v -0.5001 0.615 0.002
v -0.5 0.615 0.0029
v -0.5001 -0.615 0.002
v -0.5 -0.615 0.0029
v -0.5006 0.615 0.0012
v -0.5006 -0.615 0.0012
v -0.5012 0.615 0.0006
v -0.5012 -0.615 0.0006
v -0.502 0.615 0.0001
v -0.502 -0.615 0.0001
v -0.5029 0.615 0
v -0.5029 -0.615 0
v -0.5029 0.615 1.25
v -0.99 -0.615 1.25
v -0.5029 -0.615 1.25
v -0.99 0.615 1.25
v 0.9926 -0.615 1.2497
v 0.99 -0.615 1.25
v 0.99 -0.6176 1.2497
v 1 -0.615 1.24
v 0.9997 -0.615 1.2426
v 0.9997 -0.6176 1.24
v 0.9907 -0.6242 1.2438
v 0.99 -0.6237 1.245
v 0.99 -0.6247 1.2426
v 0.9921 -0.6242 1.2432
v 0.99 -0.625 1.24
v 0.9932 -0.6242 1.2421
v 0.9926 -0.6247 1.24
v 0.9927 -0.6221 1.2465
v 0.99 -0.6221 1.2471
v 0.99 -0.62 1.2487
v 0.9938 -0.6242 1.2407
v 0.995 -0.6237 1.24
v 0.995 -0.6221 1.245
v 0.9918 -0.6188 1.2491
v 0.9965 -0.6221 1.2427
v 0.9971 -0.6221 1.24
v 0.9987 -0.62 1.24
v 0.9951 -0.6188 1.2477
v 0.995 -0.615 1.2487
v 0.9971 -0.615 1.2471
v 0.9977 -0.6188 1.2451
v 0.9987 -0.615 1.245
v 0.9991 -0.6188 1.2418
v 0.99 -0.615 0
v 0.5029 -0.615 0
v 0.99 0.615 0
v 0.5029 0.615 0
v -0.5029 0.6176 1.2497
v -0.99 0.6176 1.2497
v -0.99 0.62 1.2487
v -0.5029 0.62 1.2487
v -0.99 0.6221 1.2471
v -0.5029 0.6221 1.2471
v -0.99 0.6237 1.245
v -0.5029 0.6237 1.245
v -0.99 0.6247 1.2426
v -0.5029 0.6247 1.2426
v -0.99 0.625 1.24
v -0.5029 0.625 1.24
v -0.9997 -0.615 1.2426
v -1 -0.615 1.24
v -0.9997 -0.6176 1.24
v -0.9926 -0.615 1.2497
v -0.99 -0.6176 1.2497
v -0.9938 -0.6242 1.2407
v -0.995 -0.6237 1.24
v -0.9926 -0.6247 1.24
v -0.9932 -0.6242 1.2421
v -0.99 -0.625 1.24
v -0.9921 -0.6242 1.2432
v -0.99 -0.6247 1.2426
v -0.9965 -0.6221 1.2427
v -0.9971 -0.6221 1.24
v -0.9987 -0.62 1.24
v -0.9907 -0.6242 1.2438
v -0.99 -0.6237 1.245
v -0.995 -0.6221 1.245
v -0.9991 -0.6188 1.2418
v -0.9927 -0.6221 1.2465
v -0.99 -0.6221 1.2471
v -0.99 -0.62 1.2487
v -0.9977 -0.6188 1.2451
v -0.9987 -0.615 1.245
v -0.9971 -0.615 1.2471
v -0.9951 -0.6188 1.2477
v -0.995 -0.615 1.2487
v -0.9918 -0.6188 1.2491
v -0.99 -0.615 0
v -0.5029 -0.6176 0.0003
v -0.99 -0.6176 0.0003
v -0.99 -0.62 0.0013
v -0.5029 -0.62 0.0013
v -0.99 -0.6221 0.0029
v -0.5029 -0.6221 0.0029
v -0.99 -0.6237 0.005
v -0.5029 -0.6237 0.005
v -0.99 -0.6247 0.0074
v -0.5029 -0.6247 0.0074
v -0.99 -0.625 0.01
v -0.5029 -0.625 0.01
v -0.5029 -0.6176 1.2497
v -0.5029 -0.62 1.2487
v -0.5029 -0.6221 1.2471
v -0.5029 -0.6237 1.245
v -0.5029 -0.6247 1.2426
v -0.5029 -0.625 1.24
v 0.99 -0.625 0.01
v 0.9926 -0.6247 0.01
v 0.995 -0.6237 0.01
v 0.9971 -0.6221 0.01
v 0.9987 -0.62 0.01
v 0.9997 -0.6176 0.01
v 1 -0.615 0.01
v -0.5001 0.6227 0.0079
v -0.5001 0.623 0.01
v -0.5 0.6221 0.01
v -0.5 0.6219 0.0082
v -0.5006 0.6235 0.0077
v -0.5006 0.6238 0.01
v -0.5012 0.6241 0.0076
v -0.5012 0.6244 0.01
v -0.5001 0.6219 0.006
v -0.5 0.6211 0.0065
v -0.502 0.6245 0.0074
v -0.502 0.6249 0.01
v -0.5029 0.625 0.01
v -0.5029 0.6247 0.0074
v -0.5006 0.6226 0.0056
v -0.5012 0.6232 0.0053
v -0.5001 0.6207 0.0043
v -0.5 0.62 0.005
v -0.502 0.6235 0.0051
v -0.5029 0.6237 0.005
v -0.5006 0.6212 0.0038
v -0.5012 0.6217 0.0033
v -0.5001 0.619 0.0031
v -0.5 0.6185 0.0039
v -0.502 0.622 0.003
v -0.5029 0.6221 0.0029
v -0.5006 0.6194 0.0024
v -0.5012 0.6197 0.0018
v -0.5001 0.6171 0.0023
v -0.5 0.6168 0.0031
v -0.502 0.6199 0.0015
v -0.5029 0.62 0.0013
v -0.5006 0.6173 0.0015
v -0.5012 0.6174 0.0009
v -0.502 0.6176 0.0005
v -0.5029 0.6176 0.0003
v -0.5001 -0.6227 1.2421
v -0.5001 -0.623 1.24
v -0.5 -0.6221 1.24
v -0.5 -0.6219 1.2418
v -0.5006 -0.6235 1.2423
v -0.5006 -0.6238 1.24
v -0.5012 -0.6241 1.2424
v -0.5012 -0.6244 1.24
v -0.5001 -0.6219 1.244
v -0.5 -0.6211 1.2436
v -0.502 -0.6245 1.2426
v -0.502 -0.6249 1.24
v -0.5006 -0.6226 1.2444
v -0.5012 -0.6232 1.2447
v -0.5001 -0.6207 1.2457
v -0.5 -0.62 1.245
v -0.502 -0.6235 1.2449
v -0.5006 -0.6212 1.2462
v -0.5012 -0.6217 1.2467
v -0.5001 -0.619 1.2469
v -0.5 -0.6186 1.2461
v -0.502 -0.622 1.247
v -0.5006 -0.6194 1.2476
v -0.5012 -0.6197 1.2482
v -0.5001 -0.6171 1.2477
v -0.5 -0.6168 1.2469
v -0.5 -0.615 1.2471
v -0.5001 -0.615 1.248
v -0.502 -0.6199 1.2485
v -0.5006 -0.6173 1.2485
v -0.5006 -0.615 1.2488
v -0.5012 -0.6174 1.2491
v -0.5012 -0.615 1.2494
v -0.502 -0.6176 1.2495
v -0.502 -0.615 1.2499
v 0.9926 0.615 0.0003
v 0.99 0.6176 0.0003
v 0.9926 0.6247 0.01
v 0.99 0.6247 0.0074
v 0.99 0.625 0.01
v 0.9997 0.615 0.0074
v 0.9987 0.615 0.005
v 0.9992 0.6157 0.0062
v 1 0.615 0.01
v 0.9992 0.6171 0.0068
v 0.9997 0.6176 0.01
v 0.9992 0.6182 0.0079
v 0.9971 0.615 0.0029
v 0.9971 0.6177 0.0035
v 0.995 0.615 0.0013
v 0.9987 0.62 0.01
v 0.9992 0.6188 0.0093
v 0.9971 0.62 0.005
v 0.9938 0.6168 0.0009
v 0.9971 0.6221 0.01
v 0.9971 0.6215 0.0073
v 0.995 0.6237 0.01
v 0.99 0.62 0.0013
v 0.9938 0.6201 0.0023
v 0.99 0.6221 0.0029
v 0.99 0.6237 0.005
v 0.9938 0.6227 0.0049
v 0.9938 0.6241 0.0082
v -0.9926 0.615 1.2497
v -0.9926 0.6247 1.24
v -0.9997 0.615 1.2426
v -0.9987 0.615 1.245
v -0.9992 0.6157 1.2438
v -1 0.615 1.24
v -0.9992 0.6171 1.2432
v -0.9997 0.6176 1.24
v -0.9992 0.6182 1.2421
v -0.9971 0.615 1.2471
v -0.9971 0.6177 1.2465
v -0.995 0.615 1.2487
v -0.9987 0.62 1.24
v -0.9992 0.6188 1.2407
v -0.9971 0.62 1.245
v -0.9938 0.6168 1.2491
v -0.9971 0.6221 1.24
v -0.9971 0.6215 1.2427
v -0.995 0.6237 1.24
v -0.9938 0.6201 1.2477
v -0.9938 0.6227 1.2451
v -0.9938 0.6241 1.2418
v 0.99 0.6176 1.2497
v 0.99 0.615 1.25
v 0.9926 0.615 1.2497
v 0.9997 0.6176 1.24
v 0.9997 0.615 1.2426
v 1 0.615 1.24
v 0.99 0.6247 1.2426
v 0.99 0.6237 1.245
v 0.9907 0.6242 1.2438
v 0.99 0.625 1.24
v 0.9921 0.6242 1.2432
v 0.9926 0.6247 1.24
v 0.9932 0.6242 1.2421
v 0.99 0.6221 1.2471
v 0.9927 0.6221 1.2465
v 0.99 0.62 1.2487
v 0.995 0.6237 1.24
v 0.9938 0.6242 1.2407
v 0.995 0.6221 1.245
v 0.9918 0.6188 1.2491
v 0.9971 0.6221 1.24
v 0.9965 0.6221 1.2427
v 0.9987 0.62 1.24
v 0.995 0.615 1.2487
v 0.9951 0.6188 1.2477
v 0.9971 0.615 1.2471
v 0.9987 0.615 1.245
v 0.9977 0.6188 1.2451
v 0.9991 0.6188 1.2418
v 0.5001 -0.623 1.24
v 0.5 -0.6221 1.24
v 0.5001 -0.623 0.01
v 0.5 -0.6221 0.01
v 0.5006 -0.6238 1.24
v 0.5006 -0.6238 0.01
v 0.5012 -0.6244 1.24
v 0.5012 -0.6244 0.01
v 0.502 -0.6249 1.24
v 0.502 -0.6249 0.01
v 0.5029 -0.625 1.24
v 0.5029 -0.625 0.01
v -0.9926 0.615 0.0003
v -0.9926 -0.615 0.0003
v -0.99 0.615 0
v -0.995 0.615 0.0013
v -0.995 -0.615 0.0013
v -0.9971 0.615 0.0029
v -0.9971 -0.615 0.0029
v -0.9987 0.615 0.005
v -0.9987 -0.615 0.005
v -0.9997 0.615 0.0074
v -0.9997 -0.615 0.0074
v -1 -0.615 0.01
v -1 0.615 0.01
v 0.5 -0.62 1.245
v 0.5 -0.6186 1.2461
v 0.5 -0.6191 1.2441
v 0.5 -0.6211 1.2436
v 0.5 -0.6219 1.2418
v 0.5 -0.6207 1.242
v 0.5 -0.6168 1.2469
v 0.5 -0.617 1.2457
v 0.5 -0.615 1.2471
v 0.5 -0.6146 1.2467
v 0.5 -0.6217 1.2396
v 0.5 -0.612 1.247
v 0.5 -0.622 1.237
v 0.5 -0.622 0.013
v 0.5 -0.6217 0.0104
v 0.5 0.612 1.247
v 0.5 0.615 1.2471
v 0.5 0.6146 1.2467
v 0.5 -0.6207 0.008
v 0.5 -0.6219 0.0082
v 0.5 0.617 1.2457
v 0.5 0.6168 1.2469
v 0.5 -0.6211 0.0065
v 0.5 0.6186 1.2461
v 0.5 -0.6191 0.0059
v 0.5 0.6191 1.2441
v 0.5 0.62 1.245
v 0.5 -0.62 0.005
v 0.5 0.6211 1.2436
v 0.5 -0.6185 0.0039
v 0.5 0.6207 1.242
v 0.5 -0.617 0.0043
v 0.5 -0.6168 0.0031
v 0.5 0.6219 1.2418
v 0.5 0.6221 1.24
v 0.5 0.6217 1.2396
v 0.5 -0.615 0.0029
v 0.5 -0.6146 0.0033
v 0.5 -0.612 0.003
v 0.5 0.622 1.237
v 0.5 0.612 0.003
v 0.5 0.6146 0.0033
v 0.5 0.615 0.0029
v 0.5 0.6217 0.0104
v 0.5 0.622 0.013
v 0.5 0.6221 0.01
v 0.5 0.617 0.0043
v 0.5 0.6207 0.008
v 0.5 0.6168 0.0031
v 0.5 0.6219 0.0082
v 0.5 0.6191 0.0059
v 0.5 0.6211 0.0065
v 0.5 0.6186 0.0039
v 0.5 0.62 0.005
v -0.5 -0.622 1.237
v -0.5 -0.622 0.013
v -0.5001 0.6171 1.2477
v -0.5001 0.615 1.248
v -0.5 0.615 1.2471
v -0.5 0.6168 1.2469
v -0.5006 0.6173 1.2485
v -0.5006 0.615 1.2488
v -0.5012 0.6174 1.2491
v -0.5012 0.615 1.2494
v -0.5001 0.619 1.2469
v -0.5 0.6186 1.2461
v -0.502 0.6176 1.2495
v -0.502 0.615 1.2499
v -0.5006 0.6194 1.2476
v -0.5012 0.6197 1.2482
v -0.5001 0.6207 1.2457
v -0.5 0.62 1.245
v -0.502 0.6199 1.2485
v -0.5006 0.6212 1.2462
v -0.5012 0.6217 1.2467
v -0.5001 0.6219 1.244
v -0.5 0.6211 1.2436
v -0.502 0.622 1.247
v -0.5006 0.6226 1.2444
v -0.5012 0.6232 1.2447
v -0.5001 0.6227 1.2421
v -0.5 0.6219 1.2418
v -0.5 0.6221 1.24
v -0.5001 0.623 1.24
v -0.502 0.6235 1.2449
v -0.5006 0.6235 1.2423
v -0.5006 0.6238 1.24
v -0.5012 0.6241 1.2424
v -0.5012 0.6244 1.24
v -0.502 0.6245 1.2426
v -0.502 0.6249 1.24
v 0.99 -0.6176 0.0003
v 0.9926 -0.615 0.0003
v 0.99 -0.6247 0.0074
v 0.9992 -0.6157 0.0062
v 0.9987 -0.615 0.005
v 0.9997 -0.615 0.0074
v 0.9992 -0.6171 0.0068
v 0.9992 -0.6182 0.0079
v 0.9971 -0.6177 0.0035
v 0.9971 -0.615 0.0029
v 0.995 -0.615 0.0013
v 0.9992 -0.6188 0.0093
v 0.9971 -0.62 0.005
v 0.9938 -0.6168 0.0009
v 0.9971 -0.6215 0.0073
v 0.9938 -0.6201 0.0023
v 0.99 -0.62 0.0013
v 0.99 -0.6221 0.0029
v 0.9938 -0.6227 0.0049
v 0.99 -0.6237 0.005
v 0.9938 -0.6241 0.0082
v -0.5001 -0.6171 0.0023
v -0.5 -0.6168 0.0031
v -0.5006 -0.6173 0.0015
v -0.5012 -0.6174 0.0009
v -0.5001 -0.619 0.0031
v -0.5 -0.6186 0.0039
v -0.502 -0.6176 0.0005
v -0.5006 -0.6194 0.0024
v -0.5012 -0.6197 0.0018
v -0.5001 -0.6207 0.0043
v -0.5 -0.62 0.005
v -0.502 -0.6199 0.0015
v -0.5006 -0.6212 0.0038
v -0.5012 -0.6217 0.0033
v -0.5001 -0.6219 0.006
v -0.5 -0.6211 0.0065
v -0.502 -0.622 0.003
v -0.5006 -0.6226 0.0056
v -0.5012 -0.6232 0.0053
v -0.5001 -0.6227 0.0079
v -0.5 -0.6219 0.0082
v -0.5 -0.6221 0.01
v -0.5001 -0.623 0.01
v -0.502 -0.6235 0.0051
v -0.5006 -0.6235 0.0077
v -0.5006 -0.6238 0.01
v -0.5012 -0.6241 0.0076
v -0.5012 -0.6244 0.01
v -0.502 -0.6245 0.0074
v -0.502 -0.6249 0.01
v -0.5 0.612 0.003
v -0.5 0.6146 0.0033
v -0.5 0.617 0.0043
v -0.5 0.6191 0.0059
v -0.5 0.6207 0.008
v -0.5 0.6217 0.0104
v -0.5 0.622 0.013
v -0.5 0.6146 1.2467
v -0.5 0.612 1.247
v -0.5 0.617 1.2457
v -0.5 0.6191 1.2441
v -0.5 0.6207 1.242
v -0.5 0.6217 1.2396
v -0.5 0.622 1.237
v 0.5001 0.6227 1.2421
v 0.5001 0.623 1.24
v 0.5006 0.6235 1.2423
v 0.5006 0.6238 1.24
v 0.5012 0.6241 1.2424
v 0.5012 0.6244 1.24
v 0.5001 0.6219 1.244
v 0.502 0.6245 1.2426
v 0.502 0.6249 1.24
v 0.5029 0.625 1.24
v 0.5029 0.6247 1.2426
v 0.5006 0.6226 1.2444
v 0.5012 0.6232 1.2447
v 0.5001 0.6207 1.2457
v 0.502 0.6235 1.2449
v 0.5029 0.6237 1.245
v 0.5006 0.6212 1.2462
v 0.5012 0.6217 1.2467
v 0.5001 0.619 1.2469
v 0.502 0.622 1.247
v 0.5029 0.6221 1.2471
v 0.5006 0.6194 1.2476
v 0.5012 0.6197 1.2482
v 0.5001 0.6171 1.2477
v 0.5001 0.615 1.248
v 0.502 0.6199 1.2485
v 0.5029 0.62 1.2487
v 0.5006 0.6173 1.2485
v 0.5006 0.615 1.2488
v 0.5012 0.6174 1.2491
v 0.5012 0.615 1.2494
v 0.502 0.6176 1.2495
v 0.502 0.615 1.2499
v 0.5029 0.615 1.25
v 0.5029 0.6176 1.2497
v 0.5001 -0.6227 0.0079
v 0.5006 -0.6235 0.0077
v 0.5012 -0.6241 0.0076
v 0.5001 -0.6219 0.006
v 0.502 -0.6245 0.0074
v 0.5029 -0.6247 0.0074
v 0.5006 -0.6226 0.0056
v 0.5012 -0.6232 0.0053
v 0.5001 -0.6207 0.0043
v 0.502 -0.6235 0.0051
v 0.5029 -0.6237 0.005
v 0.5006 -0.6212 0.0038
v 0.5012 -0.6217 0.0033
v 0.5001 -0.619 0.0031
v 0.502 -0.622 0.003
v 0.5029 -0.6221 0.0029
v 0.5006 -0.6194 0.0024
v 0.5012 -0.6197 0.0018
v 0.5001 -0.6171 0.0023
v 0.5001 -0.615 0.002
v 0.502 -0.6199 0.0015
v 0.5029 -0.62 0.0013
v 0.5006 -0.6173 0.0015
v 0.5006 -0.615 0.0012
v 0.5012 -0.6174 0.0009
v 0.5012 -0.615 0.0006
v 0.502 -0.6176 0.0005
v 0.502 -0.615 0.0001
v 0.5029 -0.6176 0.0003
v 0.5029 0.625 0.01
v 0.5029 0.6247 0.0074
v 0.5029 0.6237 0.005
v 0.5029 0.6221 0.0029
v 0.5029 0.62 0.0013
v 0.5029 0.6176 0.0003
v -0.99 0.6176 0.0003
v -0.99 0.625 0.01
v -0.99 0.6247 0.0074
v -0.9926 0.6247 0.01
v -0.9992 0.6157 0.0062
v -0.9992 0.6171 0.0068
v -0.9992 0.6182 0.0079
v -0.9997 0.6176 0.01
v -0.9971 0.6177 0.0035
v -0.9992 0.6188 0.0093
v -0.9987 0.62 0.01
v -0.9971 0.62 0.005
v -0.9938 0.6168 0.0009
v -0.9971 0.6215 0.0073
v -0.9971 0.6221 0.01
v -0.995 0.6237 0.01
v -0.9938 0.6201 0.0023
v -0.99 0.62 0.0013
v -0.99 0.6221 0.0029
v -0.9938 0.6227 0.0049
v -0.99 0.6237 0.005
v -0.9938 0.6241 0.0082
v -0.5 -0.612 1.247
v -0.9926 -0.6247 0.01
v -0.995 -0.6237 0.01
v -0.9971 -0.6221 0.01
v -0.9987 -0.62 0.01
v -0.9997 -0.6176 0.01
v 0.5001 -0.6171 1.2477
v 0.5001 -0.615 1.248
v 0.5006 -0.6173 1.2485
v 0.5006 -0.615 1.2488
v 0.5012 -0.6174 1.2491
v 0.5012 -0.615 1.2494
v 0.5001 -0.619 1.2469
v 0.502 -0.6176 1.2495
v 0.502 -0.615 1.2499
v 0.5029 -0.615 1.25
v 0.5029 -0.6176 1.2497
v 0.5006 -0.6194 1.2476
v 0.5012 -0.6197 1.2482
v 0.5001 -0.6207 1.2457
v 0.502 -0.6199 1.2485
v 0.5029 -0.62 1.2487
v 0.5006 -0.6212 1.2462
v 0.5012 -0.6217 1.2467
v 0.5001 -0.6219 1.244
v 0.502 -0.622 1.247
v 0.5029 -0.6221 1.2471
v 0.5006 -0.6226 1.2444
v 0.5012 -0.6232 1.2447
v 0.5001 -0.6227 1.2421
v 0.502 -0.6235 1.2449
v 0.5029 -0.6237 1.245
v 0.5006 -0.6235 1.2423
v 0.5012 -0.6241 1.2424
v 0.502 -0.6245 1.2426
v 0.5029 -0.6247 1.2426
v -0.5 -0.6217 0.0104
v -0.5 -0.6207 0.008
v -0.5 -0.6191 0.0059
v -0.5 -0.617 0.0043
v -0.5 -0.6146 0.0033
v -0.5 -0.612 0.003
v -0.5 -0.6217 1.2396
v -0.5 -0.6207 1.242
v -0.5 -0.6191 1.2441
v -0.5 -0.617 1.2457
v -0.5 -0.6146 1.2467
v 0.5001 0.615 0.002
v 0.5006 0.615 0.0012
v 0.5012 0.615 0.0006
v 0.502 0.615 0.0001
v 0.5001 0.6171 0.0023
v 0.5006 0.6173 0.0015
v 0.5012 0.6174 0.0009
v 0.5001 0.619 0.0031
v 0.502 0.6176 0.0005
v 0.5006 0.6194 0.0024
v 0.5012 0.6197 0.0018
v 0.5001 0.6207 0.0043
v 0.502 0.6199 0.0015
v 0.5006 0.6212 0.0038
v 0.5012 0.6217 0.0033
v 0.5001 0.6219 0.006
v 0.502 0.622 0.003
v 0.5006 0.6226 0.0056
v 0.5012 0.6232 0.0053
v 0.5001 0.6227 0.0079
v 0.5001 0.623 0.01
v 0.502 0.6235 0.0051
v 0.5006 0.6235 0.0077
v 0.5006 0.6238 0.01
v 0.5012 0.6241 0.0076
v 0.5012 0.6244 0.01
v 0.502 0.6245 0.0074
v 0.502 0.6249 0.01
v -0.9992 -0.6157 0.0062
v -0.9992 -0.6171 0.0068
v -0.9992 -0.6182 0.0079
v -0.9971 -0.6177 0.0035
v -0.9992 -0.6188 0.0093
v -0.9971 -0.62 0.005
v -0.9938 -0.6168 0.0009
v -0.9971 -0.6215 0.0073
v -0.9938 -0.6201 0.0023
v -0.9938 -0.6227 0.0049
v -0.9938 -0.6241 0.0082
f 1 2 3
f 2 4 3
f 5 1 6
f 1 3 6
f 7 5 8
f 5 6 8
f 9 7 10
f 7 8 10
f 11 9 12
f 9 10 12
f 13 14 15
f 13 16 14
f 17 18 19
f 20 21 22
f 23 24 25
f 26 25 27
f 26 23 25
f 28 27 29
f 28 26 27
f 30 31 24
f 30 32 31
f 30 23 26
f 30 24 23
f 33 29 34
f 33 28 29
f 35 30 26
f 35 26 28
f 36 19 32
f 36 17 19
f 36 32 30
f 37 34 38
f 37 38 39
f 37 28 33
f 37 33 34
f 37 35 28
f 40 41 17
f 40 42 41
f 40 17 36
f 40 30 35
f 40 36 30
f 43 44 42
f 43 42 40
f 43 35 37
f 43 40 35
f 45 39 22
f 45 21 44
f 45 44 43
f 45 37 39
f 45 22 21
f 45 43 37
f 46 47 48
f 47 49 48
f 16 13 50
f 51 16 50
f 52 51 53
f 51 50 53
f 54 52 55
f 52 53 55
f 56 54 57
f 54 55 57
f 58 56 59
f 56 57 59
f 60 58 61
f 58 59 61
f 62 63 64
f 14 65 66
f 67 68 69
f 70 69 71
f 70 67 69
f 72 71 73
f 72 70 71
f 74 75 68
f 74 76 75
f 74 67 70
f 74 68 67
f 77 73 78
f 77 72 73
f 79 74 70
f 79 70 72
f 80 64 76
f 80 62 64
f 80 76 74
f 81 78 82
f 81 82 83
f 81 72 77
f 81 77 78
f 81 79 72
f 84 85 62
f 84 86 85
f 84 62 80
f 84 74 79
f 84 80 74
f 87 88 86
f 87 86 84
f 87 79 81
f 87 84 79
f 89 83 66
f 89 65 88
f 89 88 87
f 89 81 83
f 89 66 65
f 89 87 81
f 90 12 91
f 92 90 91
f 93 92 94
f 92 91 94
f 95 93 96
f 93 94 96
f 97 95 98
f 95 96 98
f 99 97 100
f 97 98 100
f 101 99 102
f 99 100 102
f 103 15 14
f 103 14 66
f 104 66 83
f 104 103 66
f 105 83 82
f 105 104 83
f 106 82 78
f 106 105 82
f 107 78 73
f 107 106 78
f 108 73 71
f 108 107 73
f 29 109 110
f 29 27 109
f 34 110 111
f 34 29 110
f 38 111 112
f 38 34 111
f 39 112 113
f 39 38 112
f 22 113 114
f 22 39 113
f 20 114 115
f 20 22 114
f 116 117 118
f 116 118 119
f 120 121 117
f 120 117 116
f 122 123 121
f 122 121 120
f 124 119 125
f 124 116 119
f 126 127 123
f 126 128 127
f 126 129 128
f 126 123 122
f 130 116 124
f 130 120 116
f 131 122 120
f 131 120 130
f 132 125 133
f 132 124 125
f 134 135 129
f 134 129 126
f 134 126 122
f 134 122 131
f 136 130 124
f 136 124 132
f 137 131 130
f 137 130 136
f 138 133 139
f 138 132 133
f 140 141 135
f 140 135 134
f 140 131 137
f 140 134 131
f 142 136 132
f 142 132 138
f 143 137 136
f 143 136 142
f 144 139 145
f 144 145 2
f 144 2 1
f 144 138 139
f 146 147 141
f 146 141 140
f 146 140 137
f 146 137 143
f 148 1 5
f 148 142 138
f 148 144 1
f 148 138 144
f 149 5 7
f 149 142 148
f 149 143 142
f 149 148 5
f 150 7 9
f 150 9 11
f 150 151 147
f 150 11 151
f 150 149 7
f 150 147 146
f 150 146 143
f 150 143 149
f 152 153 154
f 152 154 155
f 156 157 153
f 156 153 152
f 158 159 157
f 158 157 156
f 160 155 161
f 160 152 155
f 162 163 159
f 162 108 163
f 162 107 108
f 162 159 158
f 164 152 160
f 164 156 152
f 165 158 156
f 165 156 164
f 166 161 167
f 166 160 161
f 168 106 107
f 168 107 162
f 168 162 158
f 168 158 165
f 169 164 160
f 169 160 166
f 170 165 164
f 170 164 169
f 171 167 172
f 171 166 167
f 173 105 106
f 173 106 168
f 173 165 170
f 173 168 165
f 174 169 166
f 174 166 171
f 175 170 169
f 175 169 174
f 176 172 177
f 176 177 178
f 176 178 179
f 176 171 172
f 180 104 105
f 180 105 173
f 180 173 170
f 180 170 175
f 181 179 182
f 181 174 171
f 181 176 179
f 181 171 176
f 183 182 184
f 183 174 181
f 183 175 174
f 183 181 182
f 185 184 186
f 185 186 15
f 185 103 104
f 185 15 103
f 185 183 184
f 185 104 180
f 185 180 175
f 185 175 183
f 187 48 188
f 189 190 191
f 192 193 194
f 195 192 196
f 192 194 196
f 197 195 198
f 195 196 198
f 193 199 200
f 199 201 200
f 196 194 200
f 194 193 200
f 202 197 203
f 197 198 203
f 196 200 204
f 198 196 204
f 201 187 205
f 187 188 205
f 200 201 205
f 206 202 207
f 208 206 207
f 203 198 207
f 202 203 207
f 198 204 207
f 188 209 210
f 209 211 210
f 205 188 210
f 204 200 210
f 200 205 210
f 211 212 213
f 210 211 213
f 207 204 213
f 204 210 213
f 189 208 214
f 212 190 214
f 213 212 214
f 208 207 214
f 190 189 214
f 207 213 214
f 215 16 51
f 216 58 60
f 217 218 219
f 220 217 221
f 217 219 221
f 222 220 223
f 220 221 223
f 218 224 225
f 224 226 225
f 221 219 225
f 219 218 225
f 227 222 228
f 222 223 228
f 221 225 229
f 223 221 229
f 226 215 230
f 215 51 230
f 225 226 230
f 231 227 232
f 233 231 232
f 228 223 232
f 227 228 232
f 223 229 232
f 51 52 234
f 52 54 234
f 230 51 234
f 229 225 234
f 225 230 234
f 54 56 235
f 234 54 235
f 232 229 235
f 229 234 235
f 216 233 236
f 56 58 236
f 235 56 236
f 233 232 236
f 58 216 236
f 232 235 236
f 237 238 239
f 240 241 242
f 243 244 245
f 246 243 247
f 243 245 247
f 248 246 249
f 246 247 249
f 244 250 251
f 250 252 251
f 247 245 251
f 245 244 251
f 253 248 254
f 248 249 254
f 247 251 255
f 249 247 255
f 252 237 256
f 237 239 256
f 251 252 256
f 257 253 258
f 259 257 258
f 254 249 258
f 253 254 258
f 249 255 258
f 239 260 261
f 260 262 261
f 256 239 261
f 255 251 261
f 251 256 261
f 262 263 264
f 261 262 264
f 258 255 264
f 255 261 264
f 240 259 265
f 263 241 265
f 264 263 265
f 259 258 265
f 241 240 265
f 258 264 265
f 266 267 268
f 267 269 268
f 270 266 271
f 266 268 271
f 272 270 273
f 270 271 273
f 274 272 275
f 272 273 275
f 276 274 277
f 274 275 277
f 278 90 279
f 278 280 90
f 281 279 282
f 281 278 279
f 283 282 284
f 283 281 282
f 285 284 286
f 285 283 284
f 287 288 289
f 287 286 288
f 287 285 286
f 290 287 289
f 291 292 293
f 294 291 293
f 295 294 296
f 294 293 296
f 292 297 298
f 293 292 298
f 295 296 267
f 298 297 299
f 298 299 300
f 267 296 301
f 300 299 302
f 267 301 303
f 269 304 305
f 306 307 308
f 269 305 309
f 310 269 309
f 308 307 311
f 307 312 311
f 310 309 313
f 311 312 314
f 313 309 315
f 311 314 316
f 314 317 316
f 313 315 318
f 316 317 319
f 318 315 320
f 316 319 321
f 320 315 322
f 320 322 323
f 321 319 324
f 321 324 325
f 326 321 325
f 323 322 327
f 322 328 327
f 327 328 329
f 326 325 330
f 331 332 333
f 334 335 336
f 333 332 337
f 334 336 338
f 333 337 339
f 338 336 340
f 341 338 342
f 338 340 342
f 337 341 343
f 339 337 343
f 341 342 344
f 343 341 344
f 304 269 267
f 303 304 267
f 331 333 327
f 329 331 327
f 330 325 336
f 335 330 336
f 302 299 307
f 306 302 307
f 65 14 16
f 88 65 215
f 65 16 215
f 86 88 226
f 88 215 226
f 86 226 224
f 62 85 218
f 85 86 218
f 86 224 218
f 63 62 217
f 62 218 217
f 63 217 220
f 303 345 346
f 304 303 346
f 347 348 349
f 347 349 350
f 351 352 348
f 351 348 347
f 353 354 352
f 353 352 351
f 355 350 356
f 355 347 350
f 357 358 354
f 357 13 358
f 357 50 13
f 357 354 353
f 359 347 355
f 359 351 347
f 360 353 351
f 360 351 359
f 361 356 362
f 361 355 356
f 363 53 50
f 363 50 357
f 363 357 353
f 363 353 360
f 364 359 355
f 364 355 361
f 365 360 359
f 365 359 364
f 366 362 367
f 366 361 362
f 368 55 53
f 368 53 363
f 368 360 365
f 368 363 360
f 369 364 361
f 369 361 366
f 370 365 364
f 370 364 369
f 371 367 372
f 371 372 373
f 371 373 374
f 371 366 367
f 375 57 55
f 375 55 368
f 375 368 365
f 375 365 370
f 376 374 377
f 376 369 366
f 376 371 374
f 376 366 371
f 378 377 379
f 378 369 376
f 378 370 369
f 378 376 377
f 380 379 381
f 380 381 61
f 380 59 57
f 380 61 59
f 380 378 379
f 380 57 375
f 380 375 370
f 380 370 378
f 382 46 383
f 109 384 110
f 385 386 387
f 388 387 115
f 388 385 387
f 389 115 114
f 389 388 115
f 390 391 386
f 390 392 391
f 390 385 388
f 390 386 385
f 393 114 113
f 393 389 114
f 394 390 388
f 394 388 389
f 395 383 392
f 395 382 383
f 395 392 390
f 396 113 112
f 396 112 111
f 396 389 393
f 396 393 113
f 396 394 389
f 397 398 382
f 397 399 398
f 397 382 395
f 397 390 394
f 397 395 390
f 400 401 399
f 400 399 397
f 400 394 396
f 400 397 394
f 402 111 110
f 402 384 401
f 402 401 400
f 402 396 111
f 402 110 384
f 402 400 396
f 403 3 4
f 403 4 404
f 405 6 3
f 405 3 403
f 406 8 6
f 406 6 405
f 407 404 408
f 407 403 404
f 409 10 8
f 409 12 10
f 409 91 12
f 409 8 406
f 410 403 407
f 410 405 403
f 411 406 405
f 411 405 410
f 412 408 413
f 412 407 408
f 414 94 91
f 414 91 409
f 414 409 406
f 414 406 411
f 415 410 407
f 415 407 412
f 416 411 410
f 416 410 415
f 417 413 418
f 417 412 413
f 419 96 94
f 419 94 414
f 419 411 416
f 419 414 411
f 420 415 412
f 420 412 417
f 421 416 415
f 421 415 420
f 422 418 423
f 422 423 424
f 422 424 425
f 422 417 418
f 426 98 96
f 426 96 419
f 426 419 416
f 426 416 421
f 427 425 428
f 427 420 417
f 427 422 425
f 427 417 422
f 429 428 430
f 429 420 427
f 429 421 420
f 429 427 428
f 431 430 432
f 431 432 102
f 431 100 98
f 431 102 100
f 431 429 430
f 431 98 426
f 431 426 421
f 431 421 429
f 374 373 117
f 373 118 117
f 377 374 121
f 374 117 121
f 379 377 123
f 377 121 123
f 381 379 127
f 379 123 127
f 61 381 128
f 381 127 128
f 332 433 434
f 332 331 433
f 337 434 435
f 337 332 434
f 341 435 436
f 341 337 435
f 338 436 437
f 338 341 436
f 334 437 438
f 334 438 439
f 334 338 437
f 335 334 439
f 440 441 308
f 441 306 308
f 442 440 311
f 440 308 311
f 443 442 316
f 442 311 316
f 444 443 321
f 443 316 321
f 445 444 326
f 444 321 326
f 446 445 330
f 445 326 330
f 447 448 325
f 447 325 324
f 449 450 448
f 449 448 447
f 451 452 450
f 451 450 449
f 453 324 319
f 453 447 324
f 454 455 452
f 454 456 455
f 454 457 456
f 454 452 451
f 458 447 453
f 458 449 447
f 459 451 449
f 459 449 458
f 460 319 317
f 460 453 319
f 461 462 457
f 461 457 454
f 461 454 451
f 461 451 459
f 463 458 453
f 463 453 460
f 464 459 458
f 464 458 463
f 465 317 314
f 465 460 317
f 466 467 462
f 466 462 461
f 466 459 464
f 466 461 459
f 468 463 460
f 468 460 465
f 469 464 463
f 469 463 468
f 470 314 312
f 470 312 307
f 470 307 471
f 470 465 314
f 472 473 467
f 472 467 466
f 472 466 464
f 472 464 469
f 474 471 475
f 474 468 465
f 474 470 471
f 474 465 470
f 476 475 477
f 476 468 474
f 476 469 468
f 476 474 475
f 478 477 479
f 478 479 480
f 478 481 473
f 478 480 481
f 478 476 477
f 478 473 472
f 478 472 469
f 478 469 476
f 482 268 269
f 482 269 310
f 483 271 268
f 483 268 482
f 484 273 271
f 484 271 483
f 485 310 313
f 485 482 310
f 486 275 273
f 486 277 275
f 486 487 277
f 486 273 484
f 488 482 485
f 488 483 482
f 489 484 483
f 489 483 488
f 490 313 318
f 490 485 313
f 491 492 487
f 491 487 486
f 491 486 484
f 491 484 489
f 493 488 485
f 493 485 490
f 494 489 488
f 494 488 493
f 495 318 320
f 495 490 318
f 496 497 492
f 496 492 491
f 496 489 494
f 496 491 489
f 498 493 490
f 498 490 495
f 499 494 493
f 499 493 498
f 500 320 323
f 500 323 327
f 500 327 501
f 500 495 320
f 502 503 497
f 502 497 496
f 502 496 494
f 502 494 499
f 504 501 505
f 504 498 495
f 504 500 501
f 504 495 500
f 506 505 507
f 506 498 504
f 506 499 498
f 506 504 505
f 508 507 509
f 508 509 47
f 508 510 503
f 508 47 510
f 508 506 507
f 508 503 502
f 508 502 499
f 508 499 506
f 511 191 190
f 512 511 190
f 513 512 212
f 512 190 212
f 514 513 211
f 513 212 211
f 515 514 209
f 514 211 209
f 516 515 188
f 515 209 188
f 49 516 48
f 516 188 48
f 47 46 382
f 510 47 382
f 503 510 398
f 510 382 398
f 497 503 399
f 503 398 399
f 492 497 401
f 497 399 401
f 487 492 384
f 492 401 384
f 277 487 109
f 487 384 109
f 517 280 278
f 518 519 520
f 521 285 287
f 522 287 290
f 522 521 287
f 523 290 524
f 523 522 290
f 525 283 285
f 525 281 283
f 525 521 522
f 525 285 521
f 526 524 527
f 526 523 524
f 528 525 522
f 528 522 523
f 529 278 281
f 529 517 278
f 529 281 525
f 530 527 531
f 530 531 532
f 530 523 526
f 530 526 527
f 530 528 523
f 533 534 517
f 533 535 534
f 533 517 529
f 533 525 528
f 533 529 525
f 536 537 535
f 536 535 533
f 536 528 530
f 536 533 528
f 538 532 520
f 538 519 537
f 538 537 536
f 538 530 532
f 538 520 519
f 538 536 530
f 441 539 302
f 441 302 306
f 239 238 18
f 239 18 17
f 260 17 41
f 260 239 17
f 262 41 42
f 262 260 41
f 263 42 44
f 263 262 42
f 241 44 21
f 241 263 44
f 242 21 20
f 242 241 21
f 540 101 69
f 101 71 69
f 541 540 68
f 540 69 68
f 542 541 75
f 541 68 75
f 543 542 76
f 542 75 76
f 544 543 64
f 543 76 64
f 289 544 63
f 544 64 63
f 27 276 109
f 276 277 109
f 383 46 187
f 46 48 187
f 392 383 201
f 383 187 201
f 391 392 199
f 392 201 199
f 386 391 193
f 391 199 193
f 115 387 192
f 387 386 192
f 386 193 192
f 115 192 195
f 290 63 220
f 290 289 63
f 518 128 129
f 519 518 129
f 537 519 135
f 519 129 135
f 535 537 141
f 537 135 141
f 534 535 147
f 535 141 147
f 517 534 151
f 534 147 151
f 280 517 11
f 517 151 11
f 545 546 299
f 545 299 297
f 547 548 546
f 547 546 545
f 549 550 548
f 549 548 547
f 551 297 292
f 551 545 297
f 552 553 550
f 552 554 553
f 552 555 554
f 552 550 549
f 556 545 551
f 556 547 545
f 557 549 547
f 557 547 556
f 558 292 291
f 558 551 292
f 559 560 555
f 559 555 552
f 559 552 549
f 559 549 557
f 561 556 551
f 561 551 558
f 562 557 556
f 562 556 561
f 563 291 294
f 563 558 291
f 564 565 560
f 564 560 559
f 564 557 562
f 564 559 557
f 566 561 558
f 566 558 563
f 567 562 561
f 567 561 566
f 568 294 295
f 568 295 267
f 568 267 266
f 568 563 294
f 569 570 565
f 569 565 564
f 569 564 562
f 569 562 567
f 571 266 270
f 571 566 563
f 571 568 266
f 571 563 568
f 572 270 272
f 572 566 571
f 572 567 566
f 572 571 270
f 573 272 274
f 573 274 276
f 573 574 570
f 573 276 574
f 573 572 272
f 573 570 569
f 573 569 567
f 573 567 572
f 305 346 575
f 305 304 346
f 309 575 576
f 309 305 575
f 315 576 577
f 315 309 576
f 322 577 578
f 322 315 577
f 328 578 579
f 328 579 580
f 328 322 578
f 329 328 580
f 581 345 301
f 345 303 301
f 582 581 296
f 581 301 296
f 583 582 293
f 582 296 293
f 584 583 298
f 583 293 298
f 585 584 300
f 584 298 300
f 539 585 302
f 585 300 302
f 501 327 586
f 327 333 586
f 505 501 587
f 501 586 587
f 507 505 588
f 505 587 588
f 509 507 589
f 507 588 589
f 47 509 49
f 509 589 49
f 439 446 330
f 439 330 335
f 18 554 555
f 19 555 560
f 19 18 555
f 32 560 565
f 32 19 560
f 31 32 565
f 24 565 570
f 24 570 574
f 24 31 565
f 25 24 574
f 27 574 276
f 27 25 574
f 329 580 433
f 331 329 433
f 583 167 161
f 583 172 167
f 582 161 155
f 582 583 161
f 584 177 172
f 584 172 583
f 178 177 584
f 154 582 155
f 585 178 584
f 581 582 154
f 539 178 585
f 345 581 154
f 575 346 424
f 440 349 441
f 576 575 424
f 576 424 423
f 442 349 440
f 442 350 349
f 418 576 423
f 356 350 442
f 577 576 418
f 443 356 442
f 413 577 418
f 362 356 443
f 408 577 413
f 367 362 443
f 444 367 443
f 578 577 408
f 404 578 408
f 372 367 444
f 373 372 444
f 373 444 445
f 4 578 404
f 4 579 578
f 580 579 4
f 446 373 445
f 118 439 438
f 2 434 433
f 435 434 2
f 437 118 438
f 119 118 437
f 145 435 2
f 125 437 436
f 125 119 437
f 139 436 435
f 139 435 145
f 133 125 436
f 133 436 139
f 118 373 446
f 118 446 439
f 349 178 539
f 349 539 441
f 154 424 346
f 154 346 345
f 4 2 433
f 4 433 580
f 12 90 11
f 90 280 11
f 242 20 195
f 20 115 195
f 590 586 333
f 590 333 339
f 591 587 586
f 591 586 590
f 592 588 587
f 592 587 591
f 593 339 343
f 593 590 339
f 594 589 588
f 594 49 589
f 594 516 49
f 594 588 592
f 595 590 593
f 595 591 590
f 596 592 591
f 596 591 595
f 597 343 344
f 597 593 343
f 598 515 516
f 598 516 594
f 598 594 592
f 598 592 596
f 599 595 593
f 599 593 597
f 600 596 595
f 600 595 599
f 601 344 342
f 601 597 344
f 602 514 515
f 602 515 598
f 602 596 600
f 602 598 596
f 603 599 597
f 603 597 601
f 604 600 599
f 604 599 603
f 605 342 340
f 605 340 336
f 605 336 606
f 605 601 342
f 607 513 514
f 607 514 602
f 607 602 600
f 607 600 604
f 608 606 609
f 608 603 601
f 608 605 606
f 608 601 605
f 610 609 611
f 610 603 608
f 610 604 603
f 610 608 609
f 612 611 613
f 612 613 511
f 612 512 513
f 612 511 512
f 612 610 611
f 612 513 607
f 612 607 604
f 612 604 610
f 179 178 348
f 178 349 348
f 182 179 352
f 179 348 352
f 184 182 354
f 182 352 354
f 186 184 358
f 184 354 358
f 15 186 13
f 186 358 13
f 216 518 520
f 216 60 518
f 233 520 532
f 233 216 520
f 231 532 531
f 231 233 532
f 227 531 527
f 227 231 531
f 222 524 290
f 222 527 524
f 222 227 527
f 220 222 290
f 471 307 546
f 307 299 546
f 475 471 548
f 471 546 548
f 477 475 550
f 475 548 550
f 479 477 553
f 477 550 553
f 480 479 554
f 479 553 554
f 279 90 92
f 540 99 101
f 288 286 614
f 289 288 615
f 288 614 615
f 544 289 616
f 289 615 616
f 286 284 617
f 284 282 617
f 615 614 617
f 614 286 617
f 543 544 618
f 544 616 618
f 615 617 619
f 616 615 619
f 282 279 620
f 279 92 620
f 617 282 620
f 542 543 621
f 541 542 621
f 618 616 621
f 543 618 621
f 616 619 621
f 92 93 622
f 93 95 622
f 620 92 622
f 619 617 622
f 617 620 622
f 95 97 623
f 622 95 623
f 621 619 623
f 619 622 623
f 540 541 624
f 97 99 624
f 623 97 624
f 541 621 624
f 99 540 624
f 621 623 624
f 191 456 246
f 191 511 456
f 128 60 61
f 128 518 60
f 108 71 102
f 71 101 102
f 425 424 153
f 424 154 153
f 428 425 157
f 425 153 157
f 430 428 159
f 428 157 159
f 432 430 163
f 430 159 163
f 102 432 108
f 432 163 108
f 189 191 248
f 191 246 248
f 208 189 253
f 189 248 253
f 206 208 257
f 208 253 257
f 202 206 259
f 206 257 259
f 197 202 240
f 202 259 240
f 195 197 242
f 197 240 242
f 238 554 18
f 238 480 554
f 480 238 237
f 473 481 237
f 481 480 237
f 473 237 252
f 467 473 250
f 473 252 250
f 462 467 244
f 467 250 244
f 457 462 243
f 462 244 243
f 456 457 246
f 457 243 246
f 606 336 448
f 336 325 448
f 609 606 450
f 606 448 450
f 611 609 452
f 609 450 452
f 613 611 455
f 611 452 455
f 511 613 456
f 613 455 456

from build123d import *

# Parameters (mm, degrees)
SKETCH1_W                           = 2
SKETCH1_H                           = 1.25
ALL_BODY_DEPTH                      = 1.25
CUT_OUT_THE_BODY_FOR_PIN_DEPTH      = 0.5
CUT_OUT_THE_BODY_FOR_PIN_DEPTH_BACK = 0.5
SKETCH2_OUTSIDE_W                   = 3.784
SKETCH2_OUTSIDE_H                   = 3.784
SKETCH2_OUTSIDE_W_2                 = 1.244
SKETCH2_OUTSIDE_H_2                 = 1.244
BODY_FILLET_R                       = 0.01
PIN_FILLET_A_R                      = 0.01
PIN_FILLET_B_R                      = 0.003


with BuildPart() as part:
    # Sketch1 → All body (new body)
    with BuildSketch(Plane.XY):
        Rectangle(SKETCH1_W, SKETCH1_H)
    extrude(amount=ALL_BODY_DEPTH)

    # Sketch2 outside → Cut out the body for pin (cut, two sides: drawn at the far end of the back side and taken through both)
    with BuildSketch(Plane(origin=(0, 0, 0), x_dir=(0, 0, -1), z_dir=(1, 0, 0)).offset(-CUT_OUT_THE_BODY_FOR_PIN_DEPTH_BACK)):
        with Locations((-0.625, 0)):
            Rectangle(SKETCH2_OUTSIDE_W, SKETCH2_OUTSIDE_H)
        with Locations((-0.625, 0)):
            Rectangle(SKETCH2_OUTSIDE_W_2, SKETCH2_OUTSIDE_H_2, mode=Mode.SUBTRACT)
    extrude(amount=CUT_OUT_THE_BODY_FOR_PIN_DEPTH + CUT_OUT_THE_BODY_FOR_PIN_DEPTH_BACK, mode=Mode.SUBTRACT)

    # Body fillet
    body_fillet_edges = [part.edges().sort_by_distance(p)[0] for p in [
        (0, 0.622, 0.003),
        (0, 0.622, 1.247),
        (0, -0.622, 1.247),
        (0, -0.622, 0.003),
    ]]
    fillet(body_fillet_edges, radius=BODY_FILLET_R)

    # Pin fillet a
    pin_fillet_a_edges = [part.edges().sort_by_distance(p)[0] for p in [
        (1, 0, 1.25),
        (-0.75, 0.625, 0),
        (0.75, -0.625, 0),
        (0.75, -0.625, 1.25),
        (-0.75, 0.625, 1.25),
        (0.75, 0.625, 1.25),
        (-1, 0, 1.25),
        (0.75, 0.625, 0),
        (1, 0, 0),
        (-0.75, -0.625, 0),
        (-1, 0, 0),
        (-1, 0.625, 0.625),
        (1, 0.625, 0.625),
        (1, -0.625, 0.625),
        (-1, -0.625, 0.625),
        (-0.75, -0.625, 1.25),
    ]]
    fillet(pin_fillet_a_edges, radius=PIN_FILLET_A_R)

    # Pin fillet b
    pin_fillet_b_edges = [part.edges().sort_by_distance(p)[0] for p in [
        (0.5, -0.625, 0.625),
        (0.5, 0, 1.25),
        (0.5, 0.625, 0.625),
        (0.5, 0, 0),
        (-0.5, 0.625, 0.625),
        (-0.5, 0, 1.25),
        (-0.5, -0.625, 0.625),
        (-0.5, 0, 0),
        (0.5, 0.622071068, 0.002928932),
        (0.5, -0.622071068, 0.002928932),
        (0.5, -0.622071068, 1.247071068),
        (0.5, 0.622071068, 1.247071068),
        (-0.5, -0.622071068, 1.247071068),
        (-0.5, 0.622071068, 1.247071068),
        (-0.5, -0.622071068, 0.002928932),
        (-0.5, 0.622071068, 0.002928932),
    ]]
    fillet(pin_fillet_b_edges, radius=PIN_FILLET_B_R - 0.0001)  # a hair under: the kernel refuses the full size


solid = part.part
